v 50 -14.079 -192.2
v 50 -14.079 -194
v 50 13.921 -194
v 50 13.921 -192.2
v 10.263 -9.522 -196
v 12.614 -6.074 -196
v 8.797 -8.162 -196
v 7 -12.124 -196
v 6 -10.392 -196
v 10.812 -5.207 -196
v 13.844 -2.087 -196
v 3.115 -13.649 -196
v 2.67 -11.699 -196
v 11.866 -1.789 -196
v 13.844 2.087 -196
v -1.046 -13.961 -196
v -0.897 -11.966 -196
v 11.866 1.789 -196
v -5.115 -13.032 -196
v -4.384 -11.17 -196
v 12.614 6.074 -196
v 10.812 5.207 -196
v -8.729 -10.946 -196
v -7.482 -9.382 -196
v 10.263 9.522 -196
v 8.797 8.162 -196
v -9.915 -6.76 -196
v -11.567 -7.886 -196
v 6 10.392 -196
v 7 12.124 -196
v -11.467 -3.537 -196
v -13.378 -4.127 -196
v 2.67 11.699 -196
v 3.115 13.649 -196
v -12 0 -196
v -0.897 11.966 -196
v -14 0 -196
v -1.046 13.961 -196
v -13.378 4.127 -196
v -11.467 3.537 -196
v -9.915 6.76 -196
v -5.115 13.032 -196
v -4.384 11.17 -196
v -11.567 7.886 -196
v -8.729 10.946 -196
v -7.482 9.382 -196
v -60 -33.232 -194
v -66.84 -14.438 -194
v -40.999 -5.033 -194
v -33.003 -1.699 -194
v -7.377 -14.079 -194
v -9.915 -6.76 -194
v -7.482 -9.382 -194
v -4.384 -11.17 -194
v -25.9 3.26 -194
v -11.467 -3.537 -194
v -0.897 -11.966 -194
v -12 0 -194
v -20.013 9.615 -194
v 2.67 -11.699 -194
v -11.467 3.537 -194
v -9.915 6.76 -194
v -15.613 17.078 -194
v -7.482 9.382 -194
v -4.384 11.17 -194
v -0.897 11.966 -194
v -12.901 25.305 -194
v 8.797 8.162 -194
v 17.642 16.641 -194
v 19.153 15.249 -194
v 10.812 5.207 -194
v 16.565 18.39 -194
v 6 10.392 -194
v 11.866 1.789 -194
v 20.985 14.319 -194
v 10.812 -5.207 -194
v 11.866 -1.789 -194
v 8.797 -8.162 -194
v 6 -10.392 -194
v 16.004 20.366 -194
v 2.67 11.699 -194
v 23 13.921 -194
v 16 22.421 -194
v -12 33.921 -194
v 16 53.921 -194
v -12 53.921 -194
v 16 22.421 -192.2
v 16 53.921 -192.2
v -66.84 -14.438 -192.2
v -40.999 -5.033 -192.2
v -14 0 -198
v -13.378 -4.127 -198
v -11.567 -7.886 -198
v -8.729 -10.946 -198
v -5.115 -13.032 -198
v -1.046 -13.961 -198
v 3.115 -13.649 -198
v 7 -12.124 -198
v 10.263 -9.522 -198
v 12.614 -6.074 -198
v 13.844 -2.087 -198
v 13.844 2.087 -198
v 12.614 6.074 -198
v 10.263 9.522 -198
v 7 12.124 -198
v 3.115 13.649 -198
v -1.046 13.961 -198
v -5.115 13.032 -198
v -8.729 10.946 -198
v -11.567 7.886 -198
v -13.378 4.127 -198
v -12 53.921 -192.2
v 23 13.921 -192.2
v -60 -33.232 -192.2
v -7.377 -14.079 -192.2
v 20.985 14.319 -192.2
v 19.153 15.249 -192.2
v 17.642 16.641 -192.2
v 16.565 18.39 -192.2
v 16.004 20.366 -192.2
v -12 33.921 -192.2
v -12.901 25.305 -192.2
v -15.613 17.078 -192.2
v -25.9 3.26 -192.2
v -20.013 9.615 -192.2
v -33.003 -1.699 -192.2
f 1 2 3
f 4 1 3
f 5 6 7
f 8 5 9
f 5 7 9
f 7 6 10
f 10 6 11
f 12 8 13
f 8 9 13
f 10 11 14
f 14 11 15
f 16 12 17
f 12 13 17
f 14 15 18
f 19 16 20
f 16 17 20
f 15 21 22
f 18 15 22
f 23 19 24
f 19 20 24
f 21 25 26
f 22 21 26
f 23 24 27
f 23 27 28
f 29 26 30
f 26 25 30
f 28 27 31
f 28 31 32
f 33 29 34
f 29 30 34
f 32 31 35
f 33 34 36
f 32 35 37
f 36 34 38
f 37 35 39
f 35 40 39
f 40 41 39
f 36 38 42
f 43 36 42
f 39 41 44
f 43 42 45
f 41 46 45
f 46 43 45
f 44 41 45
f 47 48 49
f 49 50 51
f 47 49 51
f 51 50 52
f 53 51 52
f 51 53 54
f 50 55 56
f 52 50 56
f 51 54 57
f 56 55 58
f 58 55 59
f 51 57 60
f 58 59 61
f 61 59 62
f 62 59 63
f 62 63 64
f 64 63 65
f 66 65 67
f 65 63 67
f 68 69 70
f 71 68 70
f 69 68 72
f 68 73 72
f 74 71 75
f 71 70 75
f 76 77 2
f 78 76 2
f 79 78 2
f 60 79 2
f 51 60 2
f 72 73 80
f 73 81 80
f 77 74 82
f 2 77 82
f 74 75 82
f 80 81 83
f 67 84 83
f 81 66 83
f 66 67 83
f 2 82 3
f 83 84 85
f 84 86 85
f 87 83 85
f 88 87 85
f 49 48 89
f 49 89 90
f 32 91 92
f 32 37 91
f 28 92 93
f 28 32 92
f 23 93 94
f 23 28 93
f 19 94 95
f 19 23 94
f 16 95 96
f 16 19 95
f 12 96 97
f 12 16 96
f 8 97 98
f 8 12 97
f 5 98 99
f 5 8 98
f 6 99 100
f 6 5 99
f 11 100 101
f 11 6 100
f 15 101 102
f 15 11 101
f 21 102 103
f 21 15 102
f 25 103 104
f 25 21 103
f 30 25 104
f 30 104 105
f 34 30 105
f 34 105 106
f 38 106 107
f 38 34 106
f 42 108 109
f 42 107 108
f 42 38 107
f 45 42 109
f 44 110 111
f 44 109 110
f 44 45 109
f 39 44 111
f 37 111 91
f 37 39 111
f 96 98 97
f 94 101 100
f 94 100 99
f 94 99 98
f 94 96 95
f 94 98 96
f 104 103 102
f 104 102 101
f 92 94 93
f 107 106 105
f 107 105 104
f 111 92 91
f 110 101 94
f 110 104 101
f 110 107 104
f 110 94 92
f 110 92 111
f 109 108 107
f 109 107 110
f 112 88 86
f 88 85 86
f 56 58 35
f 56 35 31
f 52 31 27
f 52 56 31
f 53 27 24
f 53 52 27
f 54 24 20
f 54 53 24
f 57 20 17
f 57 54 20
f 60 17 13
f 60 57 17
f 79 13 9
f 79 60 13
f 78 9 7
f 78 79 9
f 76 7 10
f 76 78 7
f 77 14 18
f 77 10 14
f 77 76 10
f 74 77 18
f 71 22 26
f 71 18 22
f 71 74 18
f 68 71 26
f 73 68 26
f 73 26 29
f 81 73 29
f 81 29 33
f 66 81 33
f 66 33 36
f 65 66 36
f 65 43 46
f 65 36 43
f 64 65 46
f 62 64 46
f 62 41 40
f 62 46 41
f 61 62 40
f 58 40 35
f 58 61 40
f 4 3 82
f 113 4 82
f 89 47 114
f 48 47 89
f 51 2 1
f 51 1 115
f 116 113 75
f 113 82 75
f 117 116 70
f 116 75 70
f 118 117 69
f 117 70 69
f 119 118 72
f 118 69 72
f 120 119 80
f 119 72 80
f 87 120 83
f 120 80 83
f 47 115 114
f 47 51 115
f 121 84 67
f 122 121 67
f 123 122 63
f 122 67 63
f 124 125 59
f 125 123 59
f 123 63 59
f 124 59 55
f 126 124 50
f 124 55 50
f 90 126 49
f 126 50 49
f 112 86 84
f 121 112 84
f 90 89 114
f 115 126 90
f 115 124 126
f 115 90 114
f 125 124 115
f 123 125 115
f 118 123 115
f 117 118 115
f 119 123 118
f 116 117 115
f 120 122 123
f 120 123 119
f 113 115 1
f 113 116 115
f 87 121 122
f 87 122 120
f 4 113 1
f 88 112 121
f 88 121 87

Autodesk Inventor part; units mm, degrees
ref_plane "YZ Plane" through (0, 0, 0) normal (1, 0, 0) x (0, 1, 0)
ref_plane "XZ Plane" through (0, 0, 0) normal (0, 1, 0) x (-1, 0, 0)
ref_plane "XY Plane" through (0, 0, 0) normal (0, 0, 1) x (1, 0, 0)
ref_plane "РабПлоскость1" through (0, 0, -194) normal (0, 0, -1) x (-1, 0, 0)
sketch "Эскиз1" plane through (0, 0, -194) normal (0, 0, -1) x (-1, 0, 0)
  circle A0 centre (0, 0) radius 12
  dimension "d0" = 24
extrude "Выдавливание1" add sketch "Эскиз1" along normal blind 2
sketch "Эскиз2" plane through (0, 0, -196) normal (0, 0, -1) x (-1, 0, 0)
  circle A0 centre (0, 0) radius 14
  dimension "d3" = 28
extrude "Выдавливание2" add sketch "Эскиз2" along normal blind 2
sketch "Эскиз3" plane through (0, 0, -194) normal (0, 0, 1) x (1, 0, 0)
  line L0 (0, -14.0792) -> (7.9343, -14.0792)
  arc A0 (-0.2531, 24.5019) -> (-1.2854, 24.456) centre (0.2785, 0.9208) ccw
  line L1 (0.2785, 0.9208) -> (0.2785, 84.4485) construction
  line L2 (50, 13.9208) -> (23, 13.9208)
  line L3 (0, -14.0792) -> (50, -14.0792)
  line L4 (50, -14.0792) -> (50, 13.9208)
  line L5 (50, 13.9208) -> (0, -14.0792) construction
  line L6 (0, 13.9208) -> (50, -14.0792) construction
  line L7 (16, 53.9208) -> (-12, 53.9208)
  line L8 (16, 22.4208) -> (16, 53.9208)
  line L9 (16, 53.9208) -> (-9.7913, 3.9696) construction
  line L10 (-12, 53.9208) -> (16, -5.6793) construction
  arc A1 (16, 22.4208) -> (23, 13.9208) centre (23.4314, 21.4084) ccw
  line L11 (-7.3772, -14.0792) -> (-60, -33.2323)
  line L12 (-60, -33.2323) -> (-66.8404, -14.4385)
  line L13 (-66.8404, -14.4385) -> (-40.9989, -5.0329)
  line L14 (0, -14.0792) -> (-7.3772, -14.0792)
  arc A2 (-40.9989, -5.0329) -> (-12, 33.9208) centre (-52.4998, 33.7998) ccw
  line L15 (-12, 53.9208) -> (-12, 33.9208)
  arc A3 (1.8425, 24.456) -> (0.8102, 24.5019) centre (0.2785, 0.9208) ccw
  point P0 (0, 0)
  point P1 (0, 13.9208)
  point P2 (-24.4429, -0.0792)
  point P3 (-25, 0)
  point P4 (-0.7823, 25.5269)
  point P5 (0, 0)
  point P6 (25, -0.0792)
  point P7 (25.5571, 0)
  point P8 (1.3394, 25.5269)
  dimension "d21" = 28
  dimension "d22" = 28
  dimension "d23" = 20
  dimension "d24" = 50
  dimension "d25" = 110
  dimension "d26" = 160
  dimension "d27" = 40
  dimension "d28" = 27
  dimension "d29" = 31.5
  dimension "d30" = 20
  dimension "d31" = 27.5
  dimension "d32" = 56
  dimension "d33" = 40.5
  dimension "d34" = 7.5
  dimension "d35" = 34
  dimension "d36" = 53
  dimension "d37" = 50
extrude "Выдавливание3" add sketch "Эскиз3" along normal blind 1.8
properties part number "ЛЦМК000002.00.00.00.00.08"
